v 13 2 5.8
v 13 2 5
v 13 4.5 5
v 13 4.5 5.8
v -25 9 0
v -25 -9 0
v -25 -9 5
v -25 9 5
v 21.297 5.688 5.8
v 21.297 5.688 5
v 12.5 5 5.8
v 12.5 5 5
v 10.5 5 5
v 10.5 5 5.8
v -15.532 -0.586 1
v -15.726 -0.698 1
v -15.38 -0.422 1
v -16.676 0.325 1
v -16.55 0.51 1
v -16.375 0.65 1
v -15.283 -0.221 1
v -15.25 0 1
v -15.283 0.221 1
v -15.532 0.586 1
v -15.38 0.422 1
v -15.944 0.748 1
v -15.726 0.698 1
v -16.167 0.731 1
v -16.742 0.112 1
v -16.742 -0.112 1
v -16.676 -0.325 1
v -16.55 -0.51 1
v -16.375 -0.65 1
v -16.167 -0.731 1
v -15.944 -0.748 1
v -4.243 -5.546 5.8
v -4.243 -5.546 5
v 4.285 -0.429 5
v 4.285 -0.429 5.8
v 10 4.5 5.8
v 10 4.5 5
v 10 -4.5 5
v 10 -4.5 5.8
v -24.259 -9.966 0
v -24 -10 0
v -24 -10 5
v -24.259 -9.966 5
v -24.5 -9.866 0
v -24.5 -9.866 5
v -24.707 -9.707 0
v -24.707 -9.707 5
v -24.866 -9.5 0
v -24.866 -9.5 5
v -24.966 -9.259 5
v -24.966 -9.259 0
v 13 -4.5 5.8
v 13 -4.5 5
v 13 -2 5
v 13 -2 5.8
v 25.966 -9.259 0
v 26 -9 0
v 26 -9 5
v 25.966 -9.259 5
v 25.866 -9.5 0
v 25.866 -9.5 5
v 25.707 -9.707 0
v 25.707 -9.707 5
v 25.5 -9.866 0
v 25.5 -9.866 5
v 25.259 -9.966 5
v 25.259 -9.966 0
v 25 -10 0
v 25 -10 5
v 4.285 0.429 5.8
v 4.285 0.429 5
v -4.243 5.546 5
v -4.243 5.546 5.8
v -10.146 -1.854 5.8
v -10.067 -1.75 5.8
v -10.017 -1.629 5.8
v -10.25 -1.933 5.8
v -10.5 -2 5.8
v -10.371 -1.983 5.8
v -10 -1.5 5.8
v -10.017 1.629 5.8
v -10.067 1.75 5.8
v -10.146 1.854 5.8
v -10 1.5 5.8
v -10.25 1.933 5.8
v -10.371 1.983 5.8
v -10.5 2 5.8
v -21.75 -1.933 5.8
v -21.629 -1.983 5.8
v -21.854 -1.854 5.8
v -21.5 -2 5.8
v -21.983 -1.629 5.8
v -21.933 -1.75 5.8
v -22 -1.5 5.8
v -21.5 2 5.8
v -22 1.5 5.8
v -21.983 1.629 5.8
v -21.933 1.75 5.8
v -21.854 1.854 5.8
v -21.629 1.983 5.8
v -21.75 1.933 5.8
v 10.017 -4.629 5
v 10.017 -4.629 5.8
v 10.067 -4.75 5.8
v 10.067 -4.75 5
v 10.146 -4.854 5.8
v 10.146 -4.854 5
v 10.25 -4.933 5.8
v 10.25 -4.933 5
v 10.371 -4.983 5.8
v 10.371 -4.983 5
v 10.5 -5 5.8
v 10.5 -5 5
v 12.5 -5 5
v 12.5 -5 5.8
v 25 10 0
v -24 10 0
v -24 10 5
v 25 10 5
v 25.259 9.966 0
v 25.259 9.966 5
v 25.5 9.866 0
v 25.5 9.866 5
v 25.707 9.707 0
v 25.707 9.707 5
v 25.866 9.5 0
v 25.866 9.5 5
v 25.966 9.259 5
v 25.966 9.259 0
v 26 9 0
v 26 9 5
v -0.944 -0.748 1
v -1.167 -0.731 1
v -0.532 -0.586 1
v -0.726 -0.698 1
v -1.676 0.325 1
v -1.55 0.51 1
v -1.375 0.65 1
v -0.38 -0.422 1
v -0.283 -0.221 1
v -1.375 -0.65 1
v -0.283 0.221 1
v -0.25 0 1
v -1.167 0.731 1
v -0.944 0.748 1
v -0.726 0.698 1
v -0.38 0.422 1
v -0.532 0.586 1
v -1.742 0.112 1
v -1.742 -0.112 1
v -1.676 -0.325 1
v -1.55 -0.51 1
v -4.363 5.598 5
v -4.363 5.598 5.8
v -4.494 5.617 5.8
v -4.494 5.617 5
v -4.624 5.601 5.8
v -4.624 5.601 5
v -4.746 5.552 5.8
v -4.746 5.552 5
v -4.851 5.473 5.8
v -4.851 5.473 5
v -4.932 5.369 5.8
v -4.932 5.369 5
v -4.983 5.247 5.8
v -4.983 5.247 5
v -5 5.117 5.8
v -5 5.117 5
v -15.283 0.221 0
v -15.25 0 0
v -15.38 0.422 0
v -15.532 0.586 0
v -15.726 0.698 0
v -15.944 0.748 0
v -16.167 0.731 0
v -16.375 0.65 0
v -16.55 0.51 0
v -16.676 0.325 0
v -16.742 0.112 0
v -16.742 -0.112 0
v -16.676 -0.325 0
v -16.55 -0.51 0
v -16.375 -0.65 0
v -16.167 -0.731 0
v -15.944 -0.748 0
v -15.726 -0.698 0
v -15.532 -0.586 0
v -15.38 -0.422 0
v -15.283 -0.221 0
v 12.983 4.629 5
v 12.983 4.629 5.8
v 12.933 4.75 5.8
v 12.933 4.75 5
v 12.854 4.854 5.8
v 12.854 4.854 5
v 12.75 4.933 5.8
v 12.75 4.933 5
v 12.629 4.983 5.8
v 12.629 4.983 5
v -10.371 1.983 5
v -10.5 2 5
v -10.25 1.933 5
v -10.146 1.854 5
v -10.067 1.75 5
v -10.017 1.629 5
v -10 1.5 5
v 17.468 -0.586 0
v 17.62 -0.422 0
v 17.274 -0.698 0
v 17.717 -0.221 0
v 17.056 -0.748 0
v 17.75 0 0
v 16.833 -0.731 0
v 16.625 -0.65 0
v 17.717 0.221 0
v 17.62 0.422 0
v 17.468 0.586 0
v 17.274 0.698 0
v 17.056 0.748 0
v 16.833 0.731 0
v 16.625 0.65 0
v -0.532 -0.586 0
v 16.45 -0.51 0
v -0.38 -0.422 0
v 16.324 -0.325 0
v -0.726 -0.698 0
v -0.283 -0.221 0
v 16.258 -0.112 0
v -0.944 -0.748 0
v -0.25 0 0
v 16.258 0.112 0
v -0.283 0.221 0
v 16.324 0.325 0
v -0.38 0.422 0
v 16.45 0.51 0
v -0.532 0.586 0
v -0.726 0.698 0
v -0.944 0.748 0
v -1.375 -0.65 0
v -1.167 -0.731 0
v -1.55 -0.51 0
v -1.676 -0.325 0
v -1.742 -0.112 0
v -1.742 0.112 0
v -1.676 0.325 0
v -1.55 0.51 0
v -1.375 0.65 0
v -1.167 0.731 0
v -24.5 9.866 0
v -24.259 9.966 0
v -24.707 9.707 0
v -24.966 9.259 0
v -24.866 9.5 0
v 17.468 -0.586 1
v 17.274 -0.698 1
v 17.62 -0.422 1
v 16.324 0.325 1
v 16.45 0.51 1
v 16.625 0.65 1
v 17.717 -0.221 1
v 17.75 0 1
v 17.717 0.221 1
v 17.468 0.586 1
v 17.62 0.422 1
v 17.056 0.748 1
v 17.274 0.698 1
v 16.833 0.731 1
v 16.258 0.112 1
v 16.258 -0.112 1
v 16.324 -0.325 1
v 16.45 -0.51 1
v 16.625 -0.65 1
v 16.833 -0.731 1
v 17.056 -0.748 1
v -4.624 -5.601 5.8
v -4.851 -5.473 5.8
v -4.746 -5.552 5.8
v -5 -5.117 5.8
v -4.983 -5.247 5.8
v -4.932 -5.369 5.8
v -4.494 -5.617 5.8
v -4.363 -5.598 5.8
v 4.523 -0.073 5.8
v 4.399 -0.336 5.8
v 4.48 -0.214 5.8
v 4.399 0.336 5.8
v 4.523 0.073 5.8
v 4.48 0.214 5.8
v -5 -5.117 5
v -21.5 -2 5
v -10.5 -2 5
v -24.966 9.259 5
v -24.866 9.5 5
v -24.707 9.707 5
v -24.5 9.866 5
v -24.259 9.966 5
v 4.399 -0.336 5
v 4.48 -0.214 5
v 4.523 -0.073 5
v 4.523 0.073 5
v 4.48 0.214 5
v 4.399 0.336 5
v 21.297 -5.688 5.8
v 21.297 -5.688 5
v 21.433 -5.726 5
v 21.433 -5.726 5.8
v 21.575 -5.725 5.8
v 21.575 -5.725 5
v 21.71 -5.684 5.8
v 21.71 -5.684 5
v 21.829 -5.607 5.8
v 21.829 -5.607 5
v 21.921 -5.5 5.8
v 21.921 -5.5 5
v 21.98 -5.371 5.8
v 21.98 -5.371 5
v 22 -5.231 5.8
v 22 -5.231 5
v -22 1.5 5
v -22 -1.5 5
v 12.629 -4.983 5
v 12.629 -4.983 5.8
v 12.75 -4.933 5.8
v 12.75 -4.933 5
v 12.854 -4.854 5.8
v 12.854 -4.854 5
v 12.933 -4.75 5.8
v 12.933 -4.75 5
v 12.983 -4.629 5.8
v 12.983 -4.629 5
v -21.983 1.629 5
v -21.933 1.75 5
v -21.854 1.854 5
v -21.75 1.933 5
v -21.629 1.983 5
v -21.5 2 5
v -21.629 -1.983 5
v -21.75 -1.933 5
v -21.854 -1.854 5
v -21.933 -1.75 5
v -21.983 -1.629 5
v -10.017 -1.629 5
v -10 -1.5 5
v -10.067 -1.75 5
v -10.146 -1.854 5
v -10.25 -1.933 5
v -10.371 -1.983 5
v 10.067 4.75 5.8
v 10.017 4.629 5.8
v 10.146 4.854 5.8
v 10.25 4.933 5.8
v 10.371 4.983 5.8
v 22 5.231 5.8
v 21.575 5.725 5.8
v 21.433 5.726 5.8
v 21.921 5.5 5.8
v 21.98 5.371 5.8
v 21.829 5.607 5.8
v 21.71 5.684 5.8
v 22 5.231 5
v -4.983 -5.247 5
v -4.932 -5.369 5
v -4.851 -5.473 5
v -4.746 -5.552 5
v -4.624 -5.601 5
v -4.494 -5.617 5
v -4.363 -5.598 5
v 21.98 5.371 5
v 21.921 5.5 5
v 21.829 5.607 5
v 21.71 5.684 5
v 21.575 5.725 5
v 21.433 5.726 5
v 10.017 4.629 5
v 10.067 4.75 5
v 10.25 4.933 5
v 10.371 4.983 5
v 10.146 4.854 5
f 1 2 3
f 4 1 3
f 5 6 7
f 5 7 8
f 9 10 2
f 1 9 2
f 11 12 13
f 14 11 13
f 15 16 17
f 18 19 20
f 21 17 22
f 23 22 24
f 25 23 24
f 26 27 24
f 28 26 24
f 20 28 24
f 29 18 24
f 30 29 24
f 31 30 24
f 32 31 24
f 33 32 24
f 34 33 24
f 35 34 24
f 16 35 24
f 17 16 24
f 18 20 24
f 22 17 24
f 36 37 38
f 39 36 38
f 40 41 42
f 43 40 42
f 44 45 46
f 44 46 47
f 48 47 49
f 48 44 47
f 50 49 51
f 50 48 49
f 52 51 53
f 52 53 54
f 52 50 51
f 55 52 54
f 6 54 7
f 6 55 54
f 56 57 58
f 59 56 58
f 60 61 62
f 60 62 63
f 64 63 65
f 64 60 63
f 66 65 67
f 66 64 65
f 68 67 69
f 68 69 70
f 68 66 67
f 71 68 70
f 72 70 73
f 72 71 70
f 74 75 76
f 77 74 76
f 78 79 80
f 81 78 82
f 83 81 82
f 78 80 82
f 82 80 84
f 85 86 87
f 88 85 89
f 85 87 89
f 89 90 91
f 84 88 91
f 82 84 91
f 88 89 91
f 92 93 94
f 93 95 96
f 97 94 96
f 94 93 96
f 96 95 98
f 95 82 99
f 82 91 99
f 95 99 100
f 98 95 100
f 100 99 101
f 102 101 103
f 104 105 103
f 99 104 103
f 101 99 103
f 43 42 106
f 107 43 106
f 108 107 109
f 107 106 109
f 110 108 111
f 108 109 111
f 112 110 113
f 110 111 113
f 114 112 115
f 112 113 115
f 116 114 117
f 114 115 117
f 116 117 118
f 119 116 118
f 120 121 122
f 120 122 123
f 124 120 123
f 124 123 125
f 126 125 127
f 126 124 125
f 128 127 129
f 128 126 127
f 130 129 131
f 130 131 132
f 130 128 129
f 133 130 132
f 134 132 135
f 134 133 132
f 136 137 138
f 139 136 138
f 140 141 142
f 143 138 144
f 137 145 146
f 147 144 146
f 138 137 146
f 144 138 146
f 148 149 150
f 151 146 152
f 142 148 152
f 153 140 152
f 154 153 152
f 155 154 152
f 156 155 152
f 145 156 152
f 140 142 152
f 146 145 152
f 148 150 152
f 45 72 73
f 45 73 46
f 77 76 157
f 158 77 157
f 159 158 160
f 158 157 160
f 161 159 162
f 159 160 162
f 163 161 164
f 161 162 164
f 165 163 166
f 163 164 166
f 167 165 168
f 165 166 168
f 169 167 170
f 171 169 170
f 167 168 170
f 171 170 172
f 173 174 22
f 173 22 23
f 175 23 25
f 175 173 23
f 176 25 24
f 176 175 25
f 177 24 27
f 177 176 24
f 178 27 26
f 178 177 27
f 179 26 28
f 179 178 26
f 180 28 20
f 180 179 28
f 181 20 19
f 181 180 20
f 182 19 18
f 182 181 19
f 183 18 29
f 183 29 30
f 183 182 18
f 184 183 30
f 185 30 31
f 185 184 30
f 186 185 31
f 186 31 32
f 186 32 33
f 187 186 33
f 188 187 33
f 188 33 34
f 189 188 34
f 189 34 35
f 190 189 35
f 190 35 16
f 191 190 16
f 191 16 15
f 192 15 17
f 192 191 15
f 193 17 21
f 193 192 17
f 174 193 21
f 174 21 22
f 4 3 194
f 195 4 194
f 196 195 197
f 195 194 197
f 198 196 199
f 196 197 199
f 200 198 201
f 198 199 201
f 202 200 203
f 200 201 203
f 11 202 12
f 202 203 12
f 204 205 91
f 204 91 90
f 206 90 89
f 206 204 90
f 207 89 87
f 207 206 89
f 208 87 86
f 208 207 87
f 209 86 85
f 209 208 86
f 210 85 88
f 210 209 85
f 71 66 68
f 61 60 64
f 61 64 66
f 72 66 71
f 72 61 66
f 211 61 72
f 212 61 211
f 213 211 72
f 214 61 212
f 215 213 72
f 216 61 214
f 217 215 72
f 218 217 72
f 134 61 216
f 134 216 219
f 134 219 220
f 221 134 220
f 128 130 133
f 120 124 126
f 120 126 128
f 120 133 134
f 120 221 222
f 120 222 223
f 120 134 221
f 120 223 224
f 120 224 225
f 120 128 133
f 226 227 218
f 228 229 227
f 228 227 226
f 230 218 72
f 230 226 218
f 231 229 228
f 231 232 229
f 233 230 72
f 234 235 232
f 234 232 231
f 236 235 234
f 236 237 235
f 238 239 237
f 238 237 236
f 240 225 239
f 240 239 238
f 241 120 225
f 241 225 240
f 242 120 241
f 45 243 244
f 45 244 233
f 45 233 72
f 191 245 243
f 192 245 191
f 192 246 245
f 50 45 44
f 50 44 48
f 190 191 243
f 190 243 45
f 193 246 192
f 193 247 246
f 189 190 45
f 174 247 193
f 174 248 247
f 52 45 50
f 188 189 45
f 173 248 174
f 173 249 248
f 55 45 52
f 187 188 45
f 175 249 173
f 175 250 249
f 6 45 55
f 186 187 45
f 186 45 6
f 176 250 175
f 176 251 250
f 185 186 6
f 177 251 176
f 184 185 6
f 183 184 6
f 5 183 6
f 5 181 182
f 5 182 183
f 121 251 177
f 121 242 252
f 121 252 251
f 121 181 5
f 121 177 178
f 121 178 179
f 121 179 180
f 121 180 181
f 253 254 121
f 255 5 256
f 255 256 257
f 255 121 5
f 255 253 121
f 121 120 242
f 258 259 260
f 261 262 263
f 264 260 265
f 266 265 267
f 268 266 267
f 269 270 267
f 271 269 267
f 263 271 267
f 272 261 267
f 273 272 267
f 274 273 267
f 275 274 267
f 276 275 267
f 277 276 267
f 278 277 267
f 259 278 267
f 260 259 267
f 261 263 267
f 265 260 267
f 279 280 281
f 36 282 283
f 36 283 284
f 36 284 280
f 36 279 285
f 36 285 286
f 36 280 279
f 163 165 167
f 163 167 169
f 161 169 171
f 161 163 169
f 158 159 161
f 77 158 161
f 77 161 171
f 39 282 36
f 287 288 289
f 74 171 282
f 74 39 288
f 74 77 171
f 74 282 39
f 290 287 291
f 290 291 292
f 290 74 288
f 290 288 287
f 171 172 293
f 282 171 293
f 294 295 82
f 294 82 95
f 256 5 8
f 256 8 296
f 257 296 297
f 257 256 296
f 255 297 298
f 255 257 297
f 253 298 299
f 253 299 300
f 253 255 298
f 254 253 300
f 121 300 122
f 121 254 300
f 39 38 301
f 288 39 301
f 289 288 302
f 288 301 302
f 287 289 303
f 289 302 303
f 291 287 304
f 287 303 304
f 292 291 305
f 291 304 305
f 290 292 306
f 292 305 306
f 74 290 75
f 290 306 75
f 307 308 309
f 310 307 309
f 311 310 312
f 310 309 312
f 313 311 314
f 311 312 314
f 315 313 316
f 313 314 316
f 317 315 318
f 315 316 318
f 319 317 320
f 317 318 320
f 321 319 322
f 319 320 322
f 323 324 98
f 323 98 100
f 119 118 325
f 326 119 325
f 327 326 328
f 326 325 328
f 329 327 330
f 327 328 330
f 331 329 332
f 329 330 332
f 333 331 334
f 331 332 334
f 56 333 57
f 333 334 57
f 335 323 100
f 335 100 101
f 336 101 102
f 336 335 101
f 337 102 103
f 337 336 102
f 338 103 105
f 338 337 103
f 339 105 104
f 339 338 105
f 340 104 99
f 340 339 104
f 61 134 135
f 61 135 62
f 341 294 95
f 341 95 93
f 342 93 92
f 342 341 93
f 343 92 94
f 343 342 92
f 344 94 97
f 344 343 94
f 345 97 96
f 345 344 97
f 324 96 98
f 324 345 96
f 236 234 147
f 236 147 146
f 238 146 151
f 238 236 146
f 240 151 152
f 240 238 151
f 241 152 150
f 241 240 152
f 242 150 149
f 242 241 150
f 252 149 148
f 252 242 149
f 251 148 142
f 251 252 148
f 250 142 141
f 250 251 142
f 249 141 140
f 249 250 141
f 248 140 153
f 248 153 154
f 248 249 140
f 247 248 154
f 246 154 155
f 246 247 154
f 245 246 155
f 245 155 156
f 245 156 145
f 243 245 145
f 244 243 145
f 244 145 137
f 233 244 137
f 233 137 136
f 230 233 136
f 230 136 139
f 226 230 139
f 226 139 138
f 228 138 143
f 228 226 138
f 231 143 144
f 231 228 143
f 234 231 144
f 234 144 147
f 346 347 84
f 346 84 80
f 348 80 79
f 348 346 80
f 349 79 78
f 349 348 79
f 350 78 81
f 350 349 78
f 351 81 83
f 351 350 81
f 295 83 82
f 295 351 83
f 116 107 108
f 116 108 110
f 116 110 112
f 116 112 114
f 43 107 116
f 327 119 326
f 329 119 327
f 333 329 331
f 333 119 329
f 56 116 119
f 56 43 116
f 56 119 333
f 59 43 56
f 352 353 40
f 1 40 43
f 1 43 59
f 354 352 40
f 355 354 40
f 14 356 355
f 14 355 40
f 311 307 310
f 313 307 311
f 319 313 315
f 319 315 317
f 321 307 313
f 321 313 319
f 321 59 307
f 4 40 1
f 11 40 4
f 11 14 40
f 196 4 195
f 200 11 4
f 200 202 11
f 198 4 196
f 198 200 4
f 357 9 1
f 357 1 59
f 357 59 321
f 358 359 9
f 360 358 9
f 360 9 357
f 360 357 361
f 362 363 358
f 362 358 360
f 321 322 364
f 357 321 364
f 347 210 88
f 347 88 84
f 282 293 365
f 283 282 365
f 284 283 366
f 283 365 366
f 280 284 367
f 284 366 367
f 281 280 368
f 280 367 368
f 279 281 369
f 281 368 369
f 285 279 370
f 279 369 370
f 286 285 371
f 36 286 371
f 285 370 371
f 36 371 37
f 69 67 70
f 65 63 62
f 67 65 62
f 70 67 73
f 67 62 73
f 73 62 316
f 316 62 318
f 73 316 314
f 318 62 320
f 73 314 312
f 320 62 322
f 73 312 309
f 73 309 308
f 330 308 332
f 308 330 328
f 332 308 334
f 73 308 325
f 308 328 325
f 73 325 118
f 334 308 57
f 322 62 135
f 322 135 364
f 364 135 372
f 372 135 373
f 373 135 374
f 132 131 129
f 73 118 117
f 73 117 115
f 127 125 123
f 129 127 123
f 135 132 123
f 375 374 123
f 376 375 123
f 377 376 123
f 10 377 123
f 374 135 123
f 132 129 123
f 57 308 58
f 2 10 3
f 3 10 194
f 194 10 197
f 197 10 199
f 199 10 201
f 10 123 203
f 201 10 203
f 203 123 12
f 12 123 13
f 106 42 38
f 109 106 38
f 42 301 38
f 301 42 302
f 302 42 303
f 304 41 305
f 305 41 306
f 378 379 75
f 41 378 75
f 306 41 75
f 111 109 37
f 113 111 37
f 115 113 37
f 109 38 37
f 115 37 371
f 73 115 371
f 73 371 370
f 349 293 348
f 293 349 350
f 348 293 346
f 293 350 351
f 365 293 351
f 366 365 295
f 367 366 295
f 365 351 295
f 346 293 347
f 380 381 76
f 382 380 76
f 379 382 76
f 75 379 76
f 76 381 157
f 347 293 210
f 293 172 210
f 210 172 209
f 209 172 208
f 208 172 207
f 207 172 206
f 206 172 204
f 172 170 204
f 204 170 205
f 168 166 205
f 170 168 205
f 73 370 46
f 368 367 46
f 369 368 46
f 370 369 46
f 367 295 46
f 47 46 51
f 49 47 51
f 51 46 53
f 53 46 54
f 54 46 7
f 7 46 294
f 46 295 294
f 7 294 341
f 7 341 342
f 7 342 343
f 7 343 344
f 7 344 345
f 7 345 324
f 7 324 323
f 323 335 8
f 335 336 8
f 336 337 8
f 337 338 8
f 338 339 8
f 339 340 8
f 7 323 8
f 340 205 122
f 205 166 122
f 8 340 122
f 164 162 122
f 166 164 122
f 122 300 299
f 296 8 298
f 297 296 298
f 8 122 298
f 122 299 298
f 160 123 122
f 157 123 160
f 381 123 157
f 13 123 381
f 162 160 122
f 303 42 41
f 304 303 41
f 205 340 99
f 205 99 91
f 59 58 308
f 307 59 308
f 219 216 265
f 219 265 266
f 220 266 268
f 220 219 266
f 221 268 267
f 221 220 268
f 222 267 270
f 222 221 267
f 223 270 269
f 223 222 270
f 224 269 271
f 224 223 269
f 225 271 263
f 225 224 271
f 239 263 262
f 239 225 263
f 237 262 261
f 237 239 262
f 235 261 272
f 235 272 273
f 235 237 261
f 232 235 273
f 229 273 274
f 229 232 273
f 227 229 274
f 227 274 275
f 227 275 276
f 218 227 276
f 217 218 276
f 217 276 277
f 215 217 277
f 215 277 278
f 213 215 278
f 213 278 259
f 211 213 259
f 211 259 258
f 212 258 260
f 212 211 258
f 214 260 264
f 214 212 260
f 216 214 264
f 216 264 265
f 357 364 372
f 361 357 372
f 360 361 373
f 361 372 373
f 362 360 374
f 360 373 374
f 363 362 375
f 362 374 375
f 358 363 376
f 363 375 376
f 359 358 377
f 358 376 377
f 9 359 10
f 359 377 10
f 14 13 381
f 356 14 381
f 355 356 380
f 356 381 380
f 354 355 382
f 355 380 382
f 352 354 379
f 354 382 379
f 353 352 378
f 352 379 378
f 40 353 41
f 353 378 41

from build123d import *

# Parameters (mm, degrees)
BOSS_EXTRUDE1_DEPTH = 5
SKETCH6_R           = 0.75
CUT_EXTRUDE1_DEPTH  = 1
BOSS_EXTRUDE3_DEPTH = 0.8


with BuildPart() as part:
    # Sketch3 → Boss-Extrude1 (new body)
    with BuildSketch(Plane.XY):
        with BuildLine():
            Line((-24, 10), (25, 10))
            ThreePointArc((25, 10), (25.707106781, 9.707106781), (26, 9))
            Line((26, 9), (26, -9))
            ThreePointArc((26, -9), (25.707106781, -9.707106781), (25, -10))
            Line((25, -10), (-24, -10))
            ThreePointArc((-24, -10), (-24.707106781, -9.707106781), (-25, -9))
            Line((-25, -9), (-25, 9))
            ThreePointArc((-25, 9), (-24.707106781, 9.707106781), (-24, 10))
        make_face()
    extrude(amount=BOSS_EXTRUDE1_DEPTH)

    # Sketch6 → Cut-Extrude1 (cut)
    with BuildSketch(Plane.XY):
        with Locations((-16, 0)):
            Circle(SKETCH6_R)
        with Locations((-1, 0)):
            Circle(SKETCH6_R)
        with Locations((17, 0)):
            Circle(SKETCH6_R)
    extrude(amount=CUT_EXTRUDE1_DEPTH, mode=Mode.SUBTRACT)

    # Sketch4 → Boss-Extrude3 (add)
    with BuildSketch(Plane.XY.offset(5)):
        with BuildLine():
            Line((-5, 5.116904811), (-5, -5.116904811))
            ThreePointArc((-5, -5.116904811), (-4.746349407, -5.552004764), (-4.242752122, -5.545651273))
            Line((-4.242752122, -5.545651273), (4.285422562, -0.428746463))
            ThreePointArc((4.285422562, -0.428746463), (4.528174684, 0), (4.285422562, 0.428746463))
            Line((4.285422562, 0.428746463), (-4.242752122, 5.545651273))
            ThreePointArc((-4.242752122, 5.545651273), (-4.746349407, 5.552004764), (-5, 5.116904811))
        make_face()
        with BuildLine():
            Line((10, 4.5), (10, -4.5))
            ThreePointArc((10, -4.5), (10.146446609, -4.853553391), (10.5, -5))
            Line((10.5, -5), (12.5, -5))
            ThreePointArc((12.5, -5), (12.853553391, -4.853553391), (13, -4.5))
            Line((13, -4.5), (13, -2))
            Line((13, -2), (21.296930767, -5.687524785))
            ThreePointArc((21.296930767, -5.687524785), (21.77245677, -5.64986513), (22, -5.230619011))
            Line((22, -5.230619011), (22, 5.230619011))
            ThreePointArc((22, 5.230619011), (21.77245677, 5.64986513), (21.296930767, 5.687524785))
            Line((21.296930767, 5.687524785), (13, 2))
            Line((13, 2), (13, 4.5))
            ThreePointArc((13, 4.5), (12.853553391, 4.853553391), (12.5, 5))
            Line((12.5, 5), (10.5, 5))
            ThreePointArc((10.5, 5), (10.146446609, 4.853553391), (10, 4.5))
        make_face()
        with BuildLine():
            Line((-21.5, 2), (-10.5, 2))
            ThreePointArc((-10.5, 2), (-10.146446609, 1.853553391), (-10, 1.5))
            Line((-10, 1.5), (-10, -1.5))
            ThreePointArc((-10, -1.5), (-10.146446609, -1.853553391), (-10.5, -2))
            Line((-10.5, -2), (-21.5, -2))
            ThreePointArc((-21.5, -2), (-21.853553391, -1.853553391), (-22, -1.5))
            Line((-22, -1.5), (-22, 1.5))
            ThreePointArc((-22, 1.5), (-21.853553391, 1.853553391), (-21.5, 2))
        make_face()
    extrude(amount=BOSS_EXTRUDE3_DEPTH)


solid = part.part
